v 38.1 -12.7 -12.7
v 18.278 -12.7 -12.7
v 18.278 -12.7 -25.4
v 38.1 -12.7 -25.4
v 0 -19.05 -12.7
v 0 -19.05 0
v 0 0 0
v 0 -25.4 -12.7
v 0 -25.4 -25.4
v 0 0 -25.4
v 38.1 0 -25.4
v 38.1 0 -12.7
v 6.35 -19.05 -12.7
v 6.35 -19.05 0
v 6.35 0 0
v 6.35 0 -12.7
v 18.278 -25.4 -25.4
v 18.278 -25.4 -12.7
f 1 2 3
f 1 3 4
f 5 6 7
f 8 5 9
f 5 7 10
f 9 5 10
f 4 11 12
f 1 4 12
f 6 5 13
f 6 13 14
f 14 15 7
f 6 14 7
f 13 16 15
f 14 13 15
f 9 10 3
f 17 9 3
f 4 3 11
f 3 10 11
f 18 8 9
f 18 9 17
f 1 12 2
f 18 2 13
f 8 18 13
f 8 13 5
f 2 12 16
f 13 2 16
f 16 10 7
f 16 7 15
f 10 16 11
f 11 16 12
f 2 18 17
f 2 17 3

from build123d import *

# Parameters (mm, degrees)
F1_DEPTH = 25.4
F2_W     = 20.863877578
F2_H     = 13.4999741197
F3_DEPTH = 25.401
F4_W     = 7.9661535591
F4_H     = 12.7
F5_DEPTH = 25.4


with BuildPart() as f1:
    # F0 (on Front) → F1 (new body)
    with BuildSketch(Plane.XZ):
        Polygon((6.35, 0), (0, 0), (0, -25.4), (38.1, -25.4), (38.1, -12.7), (6.35, -12.7), align=None)
    extrude(amount=F1_DEPTH)

    # F2 (on Top) → F3 (cut, through all)
    with BuildSketch(Plane.XY):
        with Locations((28.710431435, -19.4499870598)):
            Rectangle(F2_W, F2_H)
    extrude(amount=-F3_DEPTH, mode=Mode.SUBTRACT)

    # F4 (on Right) → F5 (cut)
    with BuildSketch(Plane.YZ):
        with Locations((-23.0330767795, -6.35)):
            Rectangle(F4_W, F4_H)
    extrude(amount=F5_DEPTH, mode=Mode.SUBTRACT)


solid = f1.part
